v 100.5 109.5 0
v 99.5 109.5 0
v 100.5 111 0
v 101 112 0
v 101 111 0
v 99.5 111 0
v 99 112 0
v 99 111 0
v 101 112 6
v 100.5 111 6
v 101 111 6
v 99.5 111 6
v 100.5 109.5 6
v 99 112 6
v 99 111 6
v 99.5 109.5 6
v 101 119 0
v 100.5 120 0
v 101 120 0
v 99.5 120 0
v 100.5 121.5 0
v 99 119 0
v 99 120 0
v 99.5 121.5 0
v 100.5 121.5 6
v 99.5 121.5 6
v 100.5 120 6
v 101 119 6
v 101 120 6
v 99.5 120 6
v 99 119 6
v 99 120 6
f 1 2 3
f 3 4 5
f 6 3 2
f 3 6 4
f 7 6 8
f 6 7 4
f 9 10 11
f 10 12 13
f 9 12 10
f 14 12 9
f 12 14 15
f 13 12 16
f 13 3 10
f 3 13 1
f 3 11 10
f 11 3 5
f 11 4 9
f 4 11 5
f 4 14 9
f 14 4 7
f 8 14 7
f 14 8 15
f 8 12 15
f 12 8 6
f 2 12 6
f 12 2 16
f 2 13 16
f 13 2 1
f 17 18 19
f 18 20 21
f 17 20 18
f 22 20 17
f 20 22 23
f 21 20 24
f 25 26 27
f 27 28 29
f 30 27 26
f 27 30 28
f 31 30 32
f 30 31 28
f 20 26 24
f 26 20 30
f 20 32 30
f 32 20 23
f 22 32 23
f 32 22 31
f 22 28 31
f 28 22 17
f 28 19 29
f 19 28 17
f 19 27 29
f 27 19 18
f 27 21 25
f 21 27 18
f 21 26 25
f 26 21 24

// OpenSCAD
// file: ports.scad
$fn = 64;

//3point5_jack();
//micro_usb();
//translate([0, 3, 0])
//micro_usb_holders();

module 3point5_jack() {
    translate([20, -7, 0])
    rotate([90, 0, 55])
    cylinder(6, 3, 3);
}

module micro_usb() {
    translate([100, 112, 0])
    rotate(90)
    linear_extrude(6)
    square([11, 8]);
}

module micro_usb_holder() {
    linear_extrude(6)
    union() {
        translate([-1, -4.5, 0])
        square([2, 1]);
        translate([-0.5, -6, 0])
        square([1, 1.5]);
    }
}

module micro_usb_holders() {
    micro_usb_holder();
    rotate(180)
    micro_usb_holder();
}
// file: screw.scad
$fn = 64;

//screw();
//screw_hold(15);

module screw() {
    //translate([0, 0, 5])
    //rotate([0, 180, 0])
    translate([0, 0, -1])
    rotate([0, 0, 0]) union() {
    screw_head_hole();
    screw_hole(6);
    }
}

module screw_head_hole() {
    cylinder(2, 2, 2);
}

module screw_hole(height) {
    cylinder(height, 1, 1);
}

module screw_hold(height) {
    difference() {
        cylinder(height, 2, 2);
        translate([0, 0, 4])
        cylinder(height, 1, 1);
    }
}
// file: switch-hole.scad
sw_length = 14;

//switch_hole(-2, 8);

/*****
//extrude_height = 8 and tanslate_z = -2 to generate the top frame with key holes
//extrude_height = 4 and tanslate_z = 0 to generate the bottom base
******/
module sq1(tanslate_z, extrude_height) {
    translate([0, 0, tanslate_z])
    linear_extrude(height = extrude_height)
    square(sw_length);
}

module sq2() {
    translate([5.5, -1, -1])
    linear_extrude(height = 3)
    square([3, 2]);
}

module sq3() {
    rotate(90)
    translate([4.5, -1, -1])
    linear_extrude(height = 3)
    square([5, 2]);
}

module sq_ring() {
    sq2();
    translate([0, 14, 0])
    sq2();
    sq3();
    translate([14, 0, 0])
    sq3();
}

module switch_hole(tanslate_z, extrude_height) {
    difference() {
        sq1(tanslate_z, extrude_height);
        //sq_ring();
    }
}
// main file
include <switch-hole.scad>
include <screw.scad>
include <ports.scad>

kb_width = 115;
kb_length = 152;
gap_between_sw_holes = 5;


union() {
    translate([100, 115.5, 0])
    micro_usb_holders();
}

//rotate(90)
//case_top();
//translate([8, 24, 0])
//screw();

module case_top() {
    difference() {
        base_frame();
        hull() {
            bottom_cut_piece1();
            bottom_cut_piece2();
        }
        union() {
            bottom_cut_piece3();
            bottom_cut_piece4();
            top_cut_piece1();
            top_cut_piece2();
            top_cut_piece3();
        }
        
        // screw holes
        union() {
            translate([12, 22, 0])
            screw();
        }
        
        union() {
            translate([12, 88, 0])
            screw();
        }
        
        union() {
            translate([92, 100, 0])
            screw();
        }
        
        union() {
            translate([70, 12, 0])
            screw();
        }
    }
}


module bottom_cut_piece2() {
    rotate(-35)
    translate([-46.3, -11.5, -1])
    linear_extrude(height = 7)
    square(30);
}

module top_cut_piece1() {
    rotate(21)
    translate([10, -60, -1])
    linear_extrude(height = 7)
    color("red") square([100, 40]);
}

module top_cut_piece2() {
    rotate(-35)
    translate([24, -3, -1])
    linear_extrude(height = 7)
    color("red") square([20, 14]);
}

module top_cut_piece3() {
    //rotate(-35)
    translate([26, -18.7, -1])
    linear_extrude(height = 7)
    color("red") square([20, 14]);
}

module bottom_cut_piece4() {
    rotate(74)
    translate([75, 25, -1])
    linear_extrude(height = 7)
    color("red") square([60, 30]);
}

module bottom_cut_piece3() {
    rotate(-35)
    translate([-25.3, -30.5, -1])
    linear_extrude(height = 7)
    color("red") square([60, 30]);
}

module base_frame() {
    difference() {
        linear_extrude(height = 4)
        switch_frame();
        keys_layout_matrix(5, 7, sw_length + gap_between_sw_holes) switch_hole(-2, 8);
    }
}

module bottom_cut_piece1() {
    translate([-20, 25, -1])
    linear_extrude(height = 7)
    square([17, 108]);
}

module switch_frame() {
    translate([-19, -20, 0])
    square([kb_width, kb_length]);
}

module keys_layout_matrix(rows, columns, distance) {
    for(i = [0: rows - 1]) {
        for(j = [0: columns - 1]) {
            if(i == 1 && j == 0) {
                // draw the single switch hole in the first column
                translate([(distance * i) + 9, distance * j, 0])
                children();
            } else if(i == 0 && j == 0) {
                // draw the main thumb switch hole
                rotate(-35)
                translate([-9, 5, 0])
                children();
            } else if(j != 0 ) { // don't draw the first column
                if(i != 0 || j != 1) { // don't draw the bottom switch hole in the second column
                    if((i != 0 || j != 5) && (i != 0 || j != 6)) { // don't draw the last two switch holes in the bottom
                        if(j == 2 || j == 4) {
                            if(i != 0) {
                                // skip thumb row (first and last)
                                translate([(distance * i) + 2, distance * j, 0])
                                children();
                            } else {
                                // draw thumb row shifted towards the thumb (first and last)
                                if(j == 2) {
                                    translate([(distance * i) + 0, (distance * j) - 10, 0])
                                    children();
                                } else {
                                    translate([(distance * i) + 2, (distance * j) - 10, 0])
                                    children();
                                }
                            }
                        } else if(j == 3) {
                            if(i != 0) {
                                // skip thumb row (middle hole)
                                translate([(distance * i) + 3, distance * j, 0])
                                children();
                            } else {
                                // draw thumb row shifted towards the thumb (middle hole)
                                translate([(distance * i) + 2, (distance * j) - 10, 0])
                                children();
                            }
                        } else if(j == 5) {
                            translate([(distance * i) - 3, distance * j, 0])
                            children();
                        } else if(j == 6) {
                            translate([(distance * i) - 4, distance * j, 0])
                            children();
                        } else {
                            translate([distance * i, distance * j, 0])
                            children();
                        }
                    }
                }
            }
        }
    }
}
